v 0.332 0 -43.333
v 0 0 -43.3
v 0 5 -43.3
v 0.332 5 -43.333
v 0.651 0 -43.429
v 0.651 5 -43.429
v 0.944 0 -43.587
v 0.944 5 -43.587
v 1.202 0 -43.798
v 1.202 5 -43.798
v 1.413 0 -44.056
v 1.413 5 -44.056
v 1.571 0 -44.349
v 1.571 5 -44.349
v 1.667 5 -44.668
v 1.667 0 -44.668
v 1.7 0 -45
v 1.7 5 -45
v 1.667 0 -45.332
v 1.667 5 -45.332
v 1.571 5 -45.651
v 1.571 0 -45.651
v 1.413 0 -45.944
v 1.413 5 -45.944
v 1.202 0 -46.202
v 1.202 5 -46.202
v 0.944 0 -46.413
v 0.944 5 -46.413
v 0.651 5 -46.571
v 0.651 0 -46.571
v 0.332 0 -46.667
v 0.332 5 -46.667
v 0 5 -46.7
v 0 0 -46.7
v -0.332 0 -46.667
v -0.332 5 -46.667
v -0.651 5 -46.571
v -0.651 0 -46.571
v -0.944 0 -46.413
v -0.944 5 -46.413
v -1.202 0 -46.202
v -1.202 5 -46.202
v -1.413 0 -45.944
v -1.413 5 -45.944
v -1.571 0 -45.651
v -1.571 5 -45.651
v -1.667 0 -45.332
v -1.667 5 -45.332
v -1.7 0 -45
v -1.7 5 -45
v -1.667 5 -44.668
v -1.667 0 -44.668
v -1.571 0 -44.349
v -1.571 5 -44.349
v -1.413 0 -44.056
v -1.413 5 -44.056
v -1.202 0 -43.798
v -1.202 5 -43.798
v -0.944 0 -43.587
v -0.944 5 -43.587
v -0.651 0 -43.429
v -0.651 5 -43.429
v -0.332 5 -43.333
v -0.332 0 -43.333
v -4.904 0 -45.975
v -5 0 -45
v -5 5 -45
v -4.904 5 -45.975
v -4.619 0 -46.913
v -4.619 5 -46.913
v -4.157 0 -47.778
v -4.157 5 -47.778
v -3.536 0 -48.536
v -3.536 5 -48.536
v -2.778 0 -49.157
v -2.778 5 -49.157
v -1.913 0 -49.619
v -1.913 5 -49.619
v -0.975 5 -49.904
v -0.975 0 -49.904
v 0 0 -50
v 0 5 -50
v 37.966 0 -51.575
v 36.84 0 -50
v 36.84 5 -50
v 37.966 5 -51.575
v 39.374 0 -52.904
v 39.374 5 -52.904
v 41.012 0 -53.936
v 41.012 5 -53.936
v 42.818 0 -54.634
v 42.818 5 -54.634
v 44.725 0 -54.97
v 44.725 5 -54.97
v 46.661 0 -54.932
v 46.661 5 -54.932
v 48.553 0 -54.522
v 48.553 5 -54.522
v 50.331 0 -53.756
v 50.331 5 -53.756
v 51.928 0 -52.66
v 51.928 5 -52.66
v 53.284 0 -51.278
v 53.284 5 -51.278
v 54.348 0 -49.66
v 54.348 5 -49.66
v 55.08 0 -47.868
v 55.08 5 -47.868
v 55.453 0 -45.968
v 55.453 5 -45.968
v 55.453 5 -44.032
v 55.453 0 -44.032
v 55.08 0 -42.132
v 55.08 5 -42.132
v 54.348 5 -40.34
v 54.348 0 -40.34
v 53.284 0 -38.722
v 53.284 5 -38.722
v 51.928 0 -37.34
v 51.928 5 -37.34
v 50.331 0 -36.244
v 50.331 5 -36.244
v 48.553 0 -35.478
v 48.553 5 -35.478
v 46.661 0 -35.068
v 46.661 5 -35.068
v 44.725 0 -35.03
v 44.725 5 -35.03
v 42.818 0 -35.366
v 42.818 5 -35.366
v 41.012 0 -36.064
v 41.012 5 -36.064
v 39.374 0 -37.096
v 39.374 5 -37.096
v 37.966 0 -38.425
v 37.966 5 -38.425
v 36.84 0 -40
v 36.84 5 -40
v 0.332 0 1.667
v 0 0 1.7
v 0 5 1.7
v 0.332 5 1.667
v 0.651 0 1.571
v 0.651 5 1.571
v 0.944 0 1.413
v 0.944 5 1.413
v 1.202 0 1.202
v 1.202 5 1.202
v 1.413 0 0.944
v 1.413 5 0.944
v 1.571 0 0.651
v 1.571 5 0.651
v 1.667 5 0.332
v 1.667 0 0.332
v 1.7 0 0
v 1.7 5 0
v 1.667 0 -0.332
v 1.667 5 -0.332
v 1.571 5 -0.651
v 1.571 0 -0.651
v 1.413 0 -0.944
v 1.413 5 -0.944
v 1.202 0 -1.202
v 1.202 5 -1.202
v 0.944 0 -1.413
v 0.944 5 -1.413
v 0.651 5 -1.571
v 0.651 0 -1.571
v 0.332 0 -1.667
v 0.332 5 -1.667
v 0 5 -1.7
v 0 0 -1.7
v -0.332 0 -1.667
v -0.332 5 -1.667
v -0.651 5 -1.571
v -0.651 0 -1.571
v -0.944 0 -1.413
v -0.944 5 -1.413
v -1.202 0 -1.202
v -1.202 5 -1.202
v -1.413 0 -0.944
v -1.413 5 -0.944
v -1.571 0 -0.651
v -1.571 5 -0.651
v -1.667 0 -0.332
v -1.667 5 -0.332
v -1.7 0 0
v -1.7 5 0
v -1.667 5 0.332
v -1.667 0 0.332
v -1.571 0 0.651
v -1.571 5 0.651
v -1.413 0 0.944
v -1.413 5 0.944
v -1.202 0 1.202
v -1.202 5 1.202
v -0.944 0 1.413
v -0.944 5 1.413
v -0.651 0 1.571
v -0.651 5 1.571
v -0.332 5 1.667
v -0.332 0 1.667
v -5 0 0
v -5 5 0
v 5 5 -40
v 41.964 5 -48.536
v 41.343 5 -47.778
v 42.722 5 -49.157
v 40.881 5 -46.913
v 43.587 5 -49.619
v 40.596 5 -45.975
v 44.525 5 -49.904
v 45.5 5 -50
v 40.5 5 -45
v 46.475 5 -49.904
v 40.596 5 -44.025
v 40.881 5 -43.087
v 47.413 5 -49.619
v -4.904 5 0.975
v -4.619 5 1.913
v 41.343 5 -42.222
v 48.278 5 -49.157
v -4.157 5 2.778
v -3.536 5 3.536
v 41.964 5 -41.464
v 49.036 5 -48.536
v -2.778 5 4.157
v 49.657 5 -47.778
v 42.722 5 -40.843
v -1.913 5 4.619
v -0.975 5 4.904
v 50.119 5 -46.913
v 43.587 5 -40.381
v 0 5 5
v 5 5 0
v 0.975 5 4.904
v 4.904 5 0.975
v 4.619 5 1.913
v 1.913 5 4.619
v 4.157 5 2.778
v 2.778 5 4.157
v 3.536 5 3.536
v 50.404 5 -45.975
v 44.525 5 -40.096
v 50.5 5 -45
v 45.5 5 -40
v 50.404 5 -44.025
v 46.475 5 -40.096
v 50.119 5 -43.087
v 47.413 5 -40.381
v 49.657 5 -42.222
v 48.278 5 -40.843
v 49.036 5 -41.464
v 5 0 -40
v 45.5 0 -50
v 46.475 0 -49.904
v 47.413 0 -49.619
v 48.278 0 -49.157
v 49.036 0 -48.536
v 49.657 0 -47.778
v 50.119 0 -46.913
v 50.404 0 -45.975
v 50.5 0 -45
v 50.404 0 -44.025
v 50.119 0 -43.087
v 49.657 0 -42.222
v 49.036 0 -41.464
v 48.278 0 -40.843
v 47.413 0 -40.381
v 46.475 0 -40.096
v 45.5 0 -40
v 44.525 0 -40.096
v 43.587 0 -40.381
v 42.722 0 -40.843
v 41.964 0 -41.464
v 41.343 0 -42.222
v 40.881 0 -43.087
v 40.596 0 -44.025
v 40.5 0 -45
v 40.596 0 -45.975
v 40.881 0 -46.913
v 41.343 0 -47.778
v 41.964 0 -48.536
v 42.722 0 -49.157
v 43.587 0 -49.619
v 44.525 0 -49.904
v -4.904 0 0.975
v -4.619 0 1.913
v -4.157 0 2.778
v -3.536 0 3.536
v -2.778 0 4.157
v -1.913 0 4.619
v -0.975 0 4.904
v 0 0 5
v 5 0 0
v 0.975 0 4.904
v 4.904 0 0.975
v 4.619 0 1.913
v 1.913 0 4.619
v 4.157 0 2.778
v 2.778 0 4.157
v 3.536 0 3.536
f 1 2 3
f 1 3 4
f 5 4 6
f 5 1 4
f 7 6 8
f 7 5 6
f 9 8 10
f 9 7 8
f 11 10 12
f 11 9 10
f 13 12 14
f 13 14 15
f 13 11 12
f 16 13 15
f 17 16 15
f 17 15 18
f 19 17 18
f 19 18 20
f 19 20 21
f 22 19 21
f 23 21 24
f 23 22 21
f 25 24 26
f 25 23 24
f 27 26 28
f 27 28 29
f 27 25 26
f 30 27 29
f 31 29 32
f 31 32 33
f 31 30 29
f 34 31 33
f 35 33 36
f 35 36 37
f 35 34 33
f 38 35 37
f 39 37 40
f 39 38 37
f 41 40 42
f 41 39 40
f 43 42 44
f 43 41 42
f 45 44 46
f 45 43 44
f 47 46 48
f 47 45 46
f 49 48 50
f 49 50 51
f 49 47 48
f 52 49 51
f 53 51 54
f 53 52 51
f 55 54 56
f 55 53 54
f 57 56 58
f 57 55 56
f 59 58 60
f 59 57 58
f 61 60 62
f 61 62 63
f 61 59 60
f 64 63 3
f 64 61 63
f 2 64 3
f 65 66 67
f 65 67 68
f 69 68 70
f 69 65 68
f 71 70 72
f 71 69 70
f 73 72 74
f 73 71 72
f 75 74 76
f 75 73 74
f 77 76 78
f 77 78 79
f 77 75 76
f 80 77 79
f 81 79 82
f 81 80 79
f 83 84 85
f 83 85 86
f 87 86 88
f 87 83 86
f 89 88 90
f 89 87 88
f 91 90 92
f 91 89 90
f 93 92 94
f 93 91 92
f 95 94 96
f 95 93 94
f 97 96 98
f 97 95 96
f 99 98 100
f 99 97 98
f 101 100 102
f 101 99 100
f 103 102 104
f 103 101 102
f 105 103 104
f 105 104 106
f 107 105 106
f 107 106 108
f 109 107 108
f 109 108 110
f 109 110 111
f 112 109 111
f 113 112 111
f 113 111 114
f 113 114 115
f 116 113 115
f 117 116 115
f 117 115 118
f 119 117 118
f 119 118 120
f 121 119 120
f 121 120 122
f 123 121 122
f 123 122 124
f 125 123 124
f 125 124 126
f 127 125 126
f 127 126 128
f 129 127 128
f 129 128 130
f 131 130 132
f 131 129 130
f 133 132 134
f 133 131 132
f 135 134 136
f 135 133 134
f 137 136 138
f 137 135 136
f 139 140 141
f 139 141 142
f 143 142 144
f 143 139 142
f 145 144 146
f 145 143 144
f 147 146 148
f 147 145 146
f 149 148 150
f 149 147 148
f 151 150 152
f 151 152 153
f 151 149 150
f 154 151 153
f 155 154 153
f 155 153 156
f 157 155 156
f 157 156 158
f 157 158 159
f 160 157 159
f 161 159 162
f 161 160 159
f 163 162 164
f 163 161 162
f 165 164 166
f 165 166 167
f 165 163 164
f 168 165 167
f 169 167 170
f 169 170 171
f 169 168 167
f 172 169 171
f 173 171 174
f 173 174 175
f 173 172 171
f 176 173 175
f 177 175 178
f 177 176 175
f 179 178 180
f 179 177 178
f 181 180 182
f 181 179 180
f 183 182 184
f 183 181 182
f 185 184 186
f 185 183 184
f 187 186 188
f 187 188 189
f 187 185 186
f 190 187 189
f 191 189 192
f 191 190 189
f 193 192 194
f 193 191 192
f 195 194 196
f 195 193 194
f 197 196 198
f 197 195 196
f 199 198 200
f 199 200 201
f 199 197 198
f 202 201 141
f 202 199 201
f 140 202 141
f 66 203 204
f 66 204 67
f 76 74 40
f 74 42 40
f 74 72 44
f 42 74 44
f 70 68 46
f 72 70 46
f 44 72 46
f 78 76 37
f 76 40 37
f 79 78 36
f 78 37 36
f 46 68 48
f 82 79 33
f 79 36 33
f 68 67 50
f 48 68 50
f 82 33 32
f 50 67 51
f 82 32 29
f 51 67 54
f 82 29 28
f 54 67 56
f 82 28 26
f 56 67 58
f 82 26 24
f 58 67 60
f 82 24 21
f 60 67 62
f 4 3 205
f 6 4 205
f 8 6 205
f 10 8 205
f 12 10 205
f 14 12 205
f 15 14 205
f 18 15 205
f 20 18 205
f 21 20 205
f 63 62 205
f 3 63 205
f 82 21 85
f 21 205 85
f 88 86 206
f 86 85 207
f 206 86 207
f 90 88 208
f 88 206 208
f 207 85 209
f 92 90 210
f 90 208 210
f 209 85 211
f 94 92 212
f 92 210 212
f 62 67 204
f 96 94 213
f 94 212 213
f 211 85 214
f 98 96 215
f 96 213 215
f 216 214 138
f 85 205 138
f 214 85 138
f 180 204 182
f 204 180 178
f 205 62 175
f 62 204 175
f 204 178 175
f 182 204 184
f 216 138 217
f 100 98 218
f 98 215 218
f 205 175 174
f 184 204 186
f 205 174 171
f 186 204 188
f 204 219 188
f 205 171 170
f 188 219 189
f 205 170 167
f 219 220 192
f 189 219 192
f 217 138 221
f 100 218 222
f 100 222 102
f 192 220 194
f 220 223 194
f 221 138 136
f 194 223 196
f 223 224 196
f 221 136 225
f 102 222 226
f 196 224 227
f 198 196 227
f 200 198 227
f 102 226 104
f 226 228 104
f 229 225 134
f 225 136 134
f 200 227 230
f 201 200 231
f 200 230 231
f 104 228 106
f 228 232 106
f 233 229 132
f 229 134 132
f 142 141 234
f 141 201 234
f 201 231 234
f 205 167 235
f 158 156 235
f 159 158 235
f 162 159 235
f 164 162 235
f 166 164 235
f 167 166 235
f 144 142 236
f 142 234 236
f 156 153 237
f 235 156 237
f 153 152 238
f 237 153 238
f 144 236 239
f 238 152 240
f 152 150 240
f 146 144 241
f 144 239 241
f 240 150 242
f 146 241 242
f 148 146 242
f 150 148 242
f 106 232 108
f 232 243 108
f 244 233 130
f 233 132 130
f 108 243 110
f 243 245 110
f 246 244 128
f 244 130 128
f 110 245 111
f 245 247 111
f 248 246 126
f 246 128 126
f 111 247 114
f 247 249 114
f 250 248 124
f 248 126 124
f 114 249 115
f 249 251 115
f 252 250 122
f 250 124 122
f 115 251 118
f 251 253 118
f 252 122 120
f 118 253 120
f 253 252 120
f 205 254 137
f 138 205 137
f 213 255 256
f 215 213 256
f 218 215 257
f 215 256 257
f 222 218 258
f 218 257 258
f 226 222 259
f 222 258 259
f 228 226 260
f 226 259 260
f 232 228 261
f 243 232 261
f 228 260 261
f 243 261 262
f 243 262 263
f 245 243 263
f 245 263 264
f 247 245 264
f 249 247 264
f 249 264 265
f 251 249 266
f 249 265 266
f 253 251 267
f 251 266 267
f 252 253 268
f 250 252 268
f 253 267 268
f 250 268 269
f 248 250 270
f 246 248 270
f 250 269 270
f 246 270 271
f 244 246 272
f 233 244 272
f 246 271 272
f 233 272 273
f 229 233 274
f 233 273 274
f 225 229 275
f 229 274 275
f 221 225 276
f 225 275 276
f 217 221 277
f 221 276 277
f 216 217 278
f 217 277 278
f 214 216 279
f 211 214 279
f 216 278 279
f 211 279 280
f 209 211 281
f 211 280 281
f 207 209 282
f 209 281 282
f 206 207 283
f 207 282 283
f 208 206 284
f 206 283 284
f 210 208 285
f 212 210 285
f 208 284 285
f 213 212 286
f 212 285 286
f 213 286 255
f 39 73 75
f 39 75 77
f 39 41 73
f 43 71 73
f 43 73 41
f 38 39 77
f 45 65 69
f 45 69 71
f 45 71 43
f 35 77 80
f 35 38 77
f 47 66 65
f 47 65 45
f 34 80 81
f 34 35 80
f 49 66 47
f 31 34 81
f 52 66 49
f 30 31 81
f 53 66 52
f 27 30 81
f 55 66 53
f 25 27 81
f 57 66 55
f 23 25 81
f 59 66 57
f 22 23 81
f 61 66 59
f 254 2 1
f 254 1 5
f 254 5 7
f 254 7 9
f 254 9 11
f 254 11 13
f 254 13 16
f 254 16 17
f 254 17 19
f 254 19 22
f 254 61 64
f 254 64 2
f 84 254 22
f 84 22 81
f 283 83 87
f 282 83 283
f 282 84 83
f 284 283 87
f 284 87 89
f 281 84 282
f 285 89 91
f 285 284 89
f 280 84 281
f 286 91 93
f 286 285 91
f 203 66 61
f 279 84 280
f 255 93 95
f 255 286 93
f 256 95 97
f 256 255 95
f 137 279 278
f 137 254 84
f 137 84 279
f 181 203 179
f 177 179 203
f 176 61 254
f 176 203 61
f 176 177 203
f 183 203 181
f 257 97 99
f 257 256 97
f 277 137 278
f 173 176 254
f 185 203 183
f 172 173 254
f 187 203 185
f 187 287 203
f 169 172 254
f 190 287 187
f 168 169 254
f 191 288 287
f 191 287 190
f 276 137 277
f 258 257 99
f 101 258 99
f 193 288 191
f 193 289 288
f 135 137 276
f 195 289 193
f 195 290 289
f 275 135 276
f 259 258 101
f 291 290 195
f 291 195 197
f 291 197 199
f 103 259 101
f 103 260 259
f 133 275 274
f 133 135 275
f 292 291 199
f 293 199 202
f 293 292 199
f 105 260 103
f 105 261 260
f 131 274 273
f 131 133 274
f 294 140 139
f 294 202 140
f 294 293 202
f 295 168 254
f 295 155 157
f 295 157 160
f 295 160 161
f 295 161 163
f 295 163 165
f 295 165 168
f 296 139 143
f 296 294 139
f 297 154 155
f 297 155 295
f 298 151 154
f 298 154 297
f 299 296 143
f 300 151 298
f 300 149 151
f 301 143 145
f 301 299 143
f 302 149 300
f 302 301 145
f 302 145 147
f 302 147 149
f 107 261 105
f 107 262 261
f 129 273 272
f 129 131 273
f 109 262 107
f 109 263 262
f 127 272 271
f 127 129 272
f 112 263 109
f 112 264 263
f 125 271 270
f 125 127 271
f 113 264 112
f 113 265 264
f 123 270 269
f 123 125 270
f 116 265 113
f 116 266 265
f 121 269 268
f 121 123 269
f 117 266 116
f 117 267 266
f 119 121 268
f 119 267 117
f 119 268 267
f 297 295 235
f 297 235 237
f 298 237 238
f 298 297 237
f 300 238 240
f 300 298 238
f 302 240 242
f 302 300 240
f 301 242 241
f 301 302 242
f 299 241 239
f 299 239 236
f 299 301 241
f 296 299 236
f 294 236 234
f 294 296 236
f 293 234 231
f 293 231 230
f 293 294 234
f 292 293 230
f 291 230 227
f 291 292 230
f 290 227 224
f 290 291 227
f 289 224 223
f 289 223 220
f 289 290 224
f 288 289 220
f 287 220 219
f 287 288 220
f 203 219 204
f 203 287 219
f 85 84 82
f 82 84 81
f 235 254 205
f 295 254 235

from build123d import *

# Parameters (mm, degrees)
SKETCH1_R           = 1.7
BOSS_EXTRUDE1_DEPTH = 5
SKETCH2_R           = 1.7
BOSS_EXTRUDE2_DEPTH = 5
SKETCH3_R           = 10
SKETCH3_R_2         = 5
BOSS_EXTRUDE3_DEPTH = 5
SKETCH4_R           = 5
CUT_EXTRUDE1_DEPTH  = 5


with BuildPart() as part:
    # Sketch1 → Boss-Extrude1 (new body)
    with BuildSketch(Plane(origin=(0, 0, 0), x_dir=(1, 0, 0), z_dir=(0, 1, 0))):
        with BuildLine():
            Line((-5, 0), (-5, 45))
            ThreePointArc((-5, 45), (0, 50), (5, 45))
            Line((5, 45), (5, 0))
            ThreePointArc((5, 0), (0, -5), (-5, 0))
        make_face()
        with Locations(Location((0, 0, 0), (0, 0, 270))):
            Circle(SKETCH1_R, mode=Mode.SUBTRACT)
        with Locations(Location((0, 45, 0), (0, 0, 270))):
            Circle(SKETCH1_R, mode=Mode.SUBTRACT)
    extrude(amount=BOSS_EXTRUDE1_DEPTH)

    # Sketch2 → Boss-Extrude2 (add)
    with BuildSketch(Plane.XZ):
        with BuildLine():
            Line((0, -40), (45.5, -40))
            ThreePointArc((45.5, -40), (50.5, -45), (45.5, -50))
            Line((45.5, -50), (0, -50))
            ThreePointArc((0, -50), (-5, -45), (0, -40))
        make_face()
        with Locations(Location((45.5, -45, 0), (0, 0, 270))):
            Circle(SKETCH2_R, mode=Mode.SUBTRACT)
        with Locations(Location((0, -45, 0), (0, 0, 90))):
            Circle(SKETCH2_R, mode=Mode.SUBTRACT)
    extrude(amount=-BOSS_EXTRUDE2_DEPTH)

    # Sketch3 → Boss-Extrude3 (add)
    with BuildSketch(Plane.XZ):
        with Locations((45.5, -45)):
            Circle(SKETCH3_R)
        with Locations((45.5, -45)):
            Circle(SKETCH3_R_2, mode=Mode.SUBTRACT)
    extrude(amount=-BOSS_EXTRUDE3_DEPTH)

    # Sketch4 → Cut-Extrude1 (cut)
    with BuildSketch(Plane.XZ):
        with Locations(Location((45.5, -45, 0), (0, 0, 270))):
            Circle(SKETCH4_R)
    extrude(amount=-CUT_EXTRUDE1_DEPTH, mode=Mode.SUBTRACT)


solid = part.part
